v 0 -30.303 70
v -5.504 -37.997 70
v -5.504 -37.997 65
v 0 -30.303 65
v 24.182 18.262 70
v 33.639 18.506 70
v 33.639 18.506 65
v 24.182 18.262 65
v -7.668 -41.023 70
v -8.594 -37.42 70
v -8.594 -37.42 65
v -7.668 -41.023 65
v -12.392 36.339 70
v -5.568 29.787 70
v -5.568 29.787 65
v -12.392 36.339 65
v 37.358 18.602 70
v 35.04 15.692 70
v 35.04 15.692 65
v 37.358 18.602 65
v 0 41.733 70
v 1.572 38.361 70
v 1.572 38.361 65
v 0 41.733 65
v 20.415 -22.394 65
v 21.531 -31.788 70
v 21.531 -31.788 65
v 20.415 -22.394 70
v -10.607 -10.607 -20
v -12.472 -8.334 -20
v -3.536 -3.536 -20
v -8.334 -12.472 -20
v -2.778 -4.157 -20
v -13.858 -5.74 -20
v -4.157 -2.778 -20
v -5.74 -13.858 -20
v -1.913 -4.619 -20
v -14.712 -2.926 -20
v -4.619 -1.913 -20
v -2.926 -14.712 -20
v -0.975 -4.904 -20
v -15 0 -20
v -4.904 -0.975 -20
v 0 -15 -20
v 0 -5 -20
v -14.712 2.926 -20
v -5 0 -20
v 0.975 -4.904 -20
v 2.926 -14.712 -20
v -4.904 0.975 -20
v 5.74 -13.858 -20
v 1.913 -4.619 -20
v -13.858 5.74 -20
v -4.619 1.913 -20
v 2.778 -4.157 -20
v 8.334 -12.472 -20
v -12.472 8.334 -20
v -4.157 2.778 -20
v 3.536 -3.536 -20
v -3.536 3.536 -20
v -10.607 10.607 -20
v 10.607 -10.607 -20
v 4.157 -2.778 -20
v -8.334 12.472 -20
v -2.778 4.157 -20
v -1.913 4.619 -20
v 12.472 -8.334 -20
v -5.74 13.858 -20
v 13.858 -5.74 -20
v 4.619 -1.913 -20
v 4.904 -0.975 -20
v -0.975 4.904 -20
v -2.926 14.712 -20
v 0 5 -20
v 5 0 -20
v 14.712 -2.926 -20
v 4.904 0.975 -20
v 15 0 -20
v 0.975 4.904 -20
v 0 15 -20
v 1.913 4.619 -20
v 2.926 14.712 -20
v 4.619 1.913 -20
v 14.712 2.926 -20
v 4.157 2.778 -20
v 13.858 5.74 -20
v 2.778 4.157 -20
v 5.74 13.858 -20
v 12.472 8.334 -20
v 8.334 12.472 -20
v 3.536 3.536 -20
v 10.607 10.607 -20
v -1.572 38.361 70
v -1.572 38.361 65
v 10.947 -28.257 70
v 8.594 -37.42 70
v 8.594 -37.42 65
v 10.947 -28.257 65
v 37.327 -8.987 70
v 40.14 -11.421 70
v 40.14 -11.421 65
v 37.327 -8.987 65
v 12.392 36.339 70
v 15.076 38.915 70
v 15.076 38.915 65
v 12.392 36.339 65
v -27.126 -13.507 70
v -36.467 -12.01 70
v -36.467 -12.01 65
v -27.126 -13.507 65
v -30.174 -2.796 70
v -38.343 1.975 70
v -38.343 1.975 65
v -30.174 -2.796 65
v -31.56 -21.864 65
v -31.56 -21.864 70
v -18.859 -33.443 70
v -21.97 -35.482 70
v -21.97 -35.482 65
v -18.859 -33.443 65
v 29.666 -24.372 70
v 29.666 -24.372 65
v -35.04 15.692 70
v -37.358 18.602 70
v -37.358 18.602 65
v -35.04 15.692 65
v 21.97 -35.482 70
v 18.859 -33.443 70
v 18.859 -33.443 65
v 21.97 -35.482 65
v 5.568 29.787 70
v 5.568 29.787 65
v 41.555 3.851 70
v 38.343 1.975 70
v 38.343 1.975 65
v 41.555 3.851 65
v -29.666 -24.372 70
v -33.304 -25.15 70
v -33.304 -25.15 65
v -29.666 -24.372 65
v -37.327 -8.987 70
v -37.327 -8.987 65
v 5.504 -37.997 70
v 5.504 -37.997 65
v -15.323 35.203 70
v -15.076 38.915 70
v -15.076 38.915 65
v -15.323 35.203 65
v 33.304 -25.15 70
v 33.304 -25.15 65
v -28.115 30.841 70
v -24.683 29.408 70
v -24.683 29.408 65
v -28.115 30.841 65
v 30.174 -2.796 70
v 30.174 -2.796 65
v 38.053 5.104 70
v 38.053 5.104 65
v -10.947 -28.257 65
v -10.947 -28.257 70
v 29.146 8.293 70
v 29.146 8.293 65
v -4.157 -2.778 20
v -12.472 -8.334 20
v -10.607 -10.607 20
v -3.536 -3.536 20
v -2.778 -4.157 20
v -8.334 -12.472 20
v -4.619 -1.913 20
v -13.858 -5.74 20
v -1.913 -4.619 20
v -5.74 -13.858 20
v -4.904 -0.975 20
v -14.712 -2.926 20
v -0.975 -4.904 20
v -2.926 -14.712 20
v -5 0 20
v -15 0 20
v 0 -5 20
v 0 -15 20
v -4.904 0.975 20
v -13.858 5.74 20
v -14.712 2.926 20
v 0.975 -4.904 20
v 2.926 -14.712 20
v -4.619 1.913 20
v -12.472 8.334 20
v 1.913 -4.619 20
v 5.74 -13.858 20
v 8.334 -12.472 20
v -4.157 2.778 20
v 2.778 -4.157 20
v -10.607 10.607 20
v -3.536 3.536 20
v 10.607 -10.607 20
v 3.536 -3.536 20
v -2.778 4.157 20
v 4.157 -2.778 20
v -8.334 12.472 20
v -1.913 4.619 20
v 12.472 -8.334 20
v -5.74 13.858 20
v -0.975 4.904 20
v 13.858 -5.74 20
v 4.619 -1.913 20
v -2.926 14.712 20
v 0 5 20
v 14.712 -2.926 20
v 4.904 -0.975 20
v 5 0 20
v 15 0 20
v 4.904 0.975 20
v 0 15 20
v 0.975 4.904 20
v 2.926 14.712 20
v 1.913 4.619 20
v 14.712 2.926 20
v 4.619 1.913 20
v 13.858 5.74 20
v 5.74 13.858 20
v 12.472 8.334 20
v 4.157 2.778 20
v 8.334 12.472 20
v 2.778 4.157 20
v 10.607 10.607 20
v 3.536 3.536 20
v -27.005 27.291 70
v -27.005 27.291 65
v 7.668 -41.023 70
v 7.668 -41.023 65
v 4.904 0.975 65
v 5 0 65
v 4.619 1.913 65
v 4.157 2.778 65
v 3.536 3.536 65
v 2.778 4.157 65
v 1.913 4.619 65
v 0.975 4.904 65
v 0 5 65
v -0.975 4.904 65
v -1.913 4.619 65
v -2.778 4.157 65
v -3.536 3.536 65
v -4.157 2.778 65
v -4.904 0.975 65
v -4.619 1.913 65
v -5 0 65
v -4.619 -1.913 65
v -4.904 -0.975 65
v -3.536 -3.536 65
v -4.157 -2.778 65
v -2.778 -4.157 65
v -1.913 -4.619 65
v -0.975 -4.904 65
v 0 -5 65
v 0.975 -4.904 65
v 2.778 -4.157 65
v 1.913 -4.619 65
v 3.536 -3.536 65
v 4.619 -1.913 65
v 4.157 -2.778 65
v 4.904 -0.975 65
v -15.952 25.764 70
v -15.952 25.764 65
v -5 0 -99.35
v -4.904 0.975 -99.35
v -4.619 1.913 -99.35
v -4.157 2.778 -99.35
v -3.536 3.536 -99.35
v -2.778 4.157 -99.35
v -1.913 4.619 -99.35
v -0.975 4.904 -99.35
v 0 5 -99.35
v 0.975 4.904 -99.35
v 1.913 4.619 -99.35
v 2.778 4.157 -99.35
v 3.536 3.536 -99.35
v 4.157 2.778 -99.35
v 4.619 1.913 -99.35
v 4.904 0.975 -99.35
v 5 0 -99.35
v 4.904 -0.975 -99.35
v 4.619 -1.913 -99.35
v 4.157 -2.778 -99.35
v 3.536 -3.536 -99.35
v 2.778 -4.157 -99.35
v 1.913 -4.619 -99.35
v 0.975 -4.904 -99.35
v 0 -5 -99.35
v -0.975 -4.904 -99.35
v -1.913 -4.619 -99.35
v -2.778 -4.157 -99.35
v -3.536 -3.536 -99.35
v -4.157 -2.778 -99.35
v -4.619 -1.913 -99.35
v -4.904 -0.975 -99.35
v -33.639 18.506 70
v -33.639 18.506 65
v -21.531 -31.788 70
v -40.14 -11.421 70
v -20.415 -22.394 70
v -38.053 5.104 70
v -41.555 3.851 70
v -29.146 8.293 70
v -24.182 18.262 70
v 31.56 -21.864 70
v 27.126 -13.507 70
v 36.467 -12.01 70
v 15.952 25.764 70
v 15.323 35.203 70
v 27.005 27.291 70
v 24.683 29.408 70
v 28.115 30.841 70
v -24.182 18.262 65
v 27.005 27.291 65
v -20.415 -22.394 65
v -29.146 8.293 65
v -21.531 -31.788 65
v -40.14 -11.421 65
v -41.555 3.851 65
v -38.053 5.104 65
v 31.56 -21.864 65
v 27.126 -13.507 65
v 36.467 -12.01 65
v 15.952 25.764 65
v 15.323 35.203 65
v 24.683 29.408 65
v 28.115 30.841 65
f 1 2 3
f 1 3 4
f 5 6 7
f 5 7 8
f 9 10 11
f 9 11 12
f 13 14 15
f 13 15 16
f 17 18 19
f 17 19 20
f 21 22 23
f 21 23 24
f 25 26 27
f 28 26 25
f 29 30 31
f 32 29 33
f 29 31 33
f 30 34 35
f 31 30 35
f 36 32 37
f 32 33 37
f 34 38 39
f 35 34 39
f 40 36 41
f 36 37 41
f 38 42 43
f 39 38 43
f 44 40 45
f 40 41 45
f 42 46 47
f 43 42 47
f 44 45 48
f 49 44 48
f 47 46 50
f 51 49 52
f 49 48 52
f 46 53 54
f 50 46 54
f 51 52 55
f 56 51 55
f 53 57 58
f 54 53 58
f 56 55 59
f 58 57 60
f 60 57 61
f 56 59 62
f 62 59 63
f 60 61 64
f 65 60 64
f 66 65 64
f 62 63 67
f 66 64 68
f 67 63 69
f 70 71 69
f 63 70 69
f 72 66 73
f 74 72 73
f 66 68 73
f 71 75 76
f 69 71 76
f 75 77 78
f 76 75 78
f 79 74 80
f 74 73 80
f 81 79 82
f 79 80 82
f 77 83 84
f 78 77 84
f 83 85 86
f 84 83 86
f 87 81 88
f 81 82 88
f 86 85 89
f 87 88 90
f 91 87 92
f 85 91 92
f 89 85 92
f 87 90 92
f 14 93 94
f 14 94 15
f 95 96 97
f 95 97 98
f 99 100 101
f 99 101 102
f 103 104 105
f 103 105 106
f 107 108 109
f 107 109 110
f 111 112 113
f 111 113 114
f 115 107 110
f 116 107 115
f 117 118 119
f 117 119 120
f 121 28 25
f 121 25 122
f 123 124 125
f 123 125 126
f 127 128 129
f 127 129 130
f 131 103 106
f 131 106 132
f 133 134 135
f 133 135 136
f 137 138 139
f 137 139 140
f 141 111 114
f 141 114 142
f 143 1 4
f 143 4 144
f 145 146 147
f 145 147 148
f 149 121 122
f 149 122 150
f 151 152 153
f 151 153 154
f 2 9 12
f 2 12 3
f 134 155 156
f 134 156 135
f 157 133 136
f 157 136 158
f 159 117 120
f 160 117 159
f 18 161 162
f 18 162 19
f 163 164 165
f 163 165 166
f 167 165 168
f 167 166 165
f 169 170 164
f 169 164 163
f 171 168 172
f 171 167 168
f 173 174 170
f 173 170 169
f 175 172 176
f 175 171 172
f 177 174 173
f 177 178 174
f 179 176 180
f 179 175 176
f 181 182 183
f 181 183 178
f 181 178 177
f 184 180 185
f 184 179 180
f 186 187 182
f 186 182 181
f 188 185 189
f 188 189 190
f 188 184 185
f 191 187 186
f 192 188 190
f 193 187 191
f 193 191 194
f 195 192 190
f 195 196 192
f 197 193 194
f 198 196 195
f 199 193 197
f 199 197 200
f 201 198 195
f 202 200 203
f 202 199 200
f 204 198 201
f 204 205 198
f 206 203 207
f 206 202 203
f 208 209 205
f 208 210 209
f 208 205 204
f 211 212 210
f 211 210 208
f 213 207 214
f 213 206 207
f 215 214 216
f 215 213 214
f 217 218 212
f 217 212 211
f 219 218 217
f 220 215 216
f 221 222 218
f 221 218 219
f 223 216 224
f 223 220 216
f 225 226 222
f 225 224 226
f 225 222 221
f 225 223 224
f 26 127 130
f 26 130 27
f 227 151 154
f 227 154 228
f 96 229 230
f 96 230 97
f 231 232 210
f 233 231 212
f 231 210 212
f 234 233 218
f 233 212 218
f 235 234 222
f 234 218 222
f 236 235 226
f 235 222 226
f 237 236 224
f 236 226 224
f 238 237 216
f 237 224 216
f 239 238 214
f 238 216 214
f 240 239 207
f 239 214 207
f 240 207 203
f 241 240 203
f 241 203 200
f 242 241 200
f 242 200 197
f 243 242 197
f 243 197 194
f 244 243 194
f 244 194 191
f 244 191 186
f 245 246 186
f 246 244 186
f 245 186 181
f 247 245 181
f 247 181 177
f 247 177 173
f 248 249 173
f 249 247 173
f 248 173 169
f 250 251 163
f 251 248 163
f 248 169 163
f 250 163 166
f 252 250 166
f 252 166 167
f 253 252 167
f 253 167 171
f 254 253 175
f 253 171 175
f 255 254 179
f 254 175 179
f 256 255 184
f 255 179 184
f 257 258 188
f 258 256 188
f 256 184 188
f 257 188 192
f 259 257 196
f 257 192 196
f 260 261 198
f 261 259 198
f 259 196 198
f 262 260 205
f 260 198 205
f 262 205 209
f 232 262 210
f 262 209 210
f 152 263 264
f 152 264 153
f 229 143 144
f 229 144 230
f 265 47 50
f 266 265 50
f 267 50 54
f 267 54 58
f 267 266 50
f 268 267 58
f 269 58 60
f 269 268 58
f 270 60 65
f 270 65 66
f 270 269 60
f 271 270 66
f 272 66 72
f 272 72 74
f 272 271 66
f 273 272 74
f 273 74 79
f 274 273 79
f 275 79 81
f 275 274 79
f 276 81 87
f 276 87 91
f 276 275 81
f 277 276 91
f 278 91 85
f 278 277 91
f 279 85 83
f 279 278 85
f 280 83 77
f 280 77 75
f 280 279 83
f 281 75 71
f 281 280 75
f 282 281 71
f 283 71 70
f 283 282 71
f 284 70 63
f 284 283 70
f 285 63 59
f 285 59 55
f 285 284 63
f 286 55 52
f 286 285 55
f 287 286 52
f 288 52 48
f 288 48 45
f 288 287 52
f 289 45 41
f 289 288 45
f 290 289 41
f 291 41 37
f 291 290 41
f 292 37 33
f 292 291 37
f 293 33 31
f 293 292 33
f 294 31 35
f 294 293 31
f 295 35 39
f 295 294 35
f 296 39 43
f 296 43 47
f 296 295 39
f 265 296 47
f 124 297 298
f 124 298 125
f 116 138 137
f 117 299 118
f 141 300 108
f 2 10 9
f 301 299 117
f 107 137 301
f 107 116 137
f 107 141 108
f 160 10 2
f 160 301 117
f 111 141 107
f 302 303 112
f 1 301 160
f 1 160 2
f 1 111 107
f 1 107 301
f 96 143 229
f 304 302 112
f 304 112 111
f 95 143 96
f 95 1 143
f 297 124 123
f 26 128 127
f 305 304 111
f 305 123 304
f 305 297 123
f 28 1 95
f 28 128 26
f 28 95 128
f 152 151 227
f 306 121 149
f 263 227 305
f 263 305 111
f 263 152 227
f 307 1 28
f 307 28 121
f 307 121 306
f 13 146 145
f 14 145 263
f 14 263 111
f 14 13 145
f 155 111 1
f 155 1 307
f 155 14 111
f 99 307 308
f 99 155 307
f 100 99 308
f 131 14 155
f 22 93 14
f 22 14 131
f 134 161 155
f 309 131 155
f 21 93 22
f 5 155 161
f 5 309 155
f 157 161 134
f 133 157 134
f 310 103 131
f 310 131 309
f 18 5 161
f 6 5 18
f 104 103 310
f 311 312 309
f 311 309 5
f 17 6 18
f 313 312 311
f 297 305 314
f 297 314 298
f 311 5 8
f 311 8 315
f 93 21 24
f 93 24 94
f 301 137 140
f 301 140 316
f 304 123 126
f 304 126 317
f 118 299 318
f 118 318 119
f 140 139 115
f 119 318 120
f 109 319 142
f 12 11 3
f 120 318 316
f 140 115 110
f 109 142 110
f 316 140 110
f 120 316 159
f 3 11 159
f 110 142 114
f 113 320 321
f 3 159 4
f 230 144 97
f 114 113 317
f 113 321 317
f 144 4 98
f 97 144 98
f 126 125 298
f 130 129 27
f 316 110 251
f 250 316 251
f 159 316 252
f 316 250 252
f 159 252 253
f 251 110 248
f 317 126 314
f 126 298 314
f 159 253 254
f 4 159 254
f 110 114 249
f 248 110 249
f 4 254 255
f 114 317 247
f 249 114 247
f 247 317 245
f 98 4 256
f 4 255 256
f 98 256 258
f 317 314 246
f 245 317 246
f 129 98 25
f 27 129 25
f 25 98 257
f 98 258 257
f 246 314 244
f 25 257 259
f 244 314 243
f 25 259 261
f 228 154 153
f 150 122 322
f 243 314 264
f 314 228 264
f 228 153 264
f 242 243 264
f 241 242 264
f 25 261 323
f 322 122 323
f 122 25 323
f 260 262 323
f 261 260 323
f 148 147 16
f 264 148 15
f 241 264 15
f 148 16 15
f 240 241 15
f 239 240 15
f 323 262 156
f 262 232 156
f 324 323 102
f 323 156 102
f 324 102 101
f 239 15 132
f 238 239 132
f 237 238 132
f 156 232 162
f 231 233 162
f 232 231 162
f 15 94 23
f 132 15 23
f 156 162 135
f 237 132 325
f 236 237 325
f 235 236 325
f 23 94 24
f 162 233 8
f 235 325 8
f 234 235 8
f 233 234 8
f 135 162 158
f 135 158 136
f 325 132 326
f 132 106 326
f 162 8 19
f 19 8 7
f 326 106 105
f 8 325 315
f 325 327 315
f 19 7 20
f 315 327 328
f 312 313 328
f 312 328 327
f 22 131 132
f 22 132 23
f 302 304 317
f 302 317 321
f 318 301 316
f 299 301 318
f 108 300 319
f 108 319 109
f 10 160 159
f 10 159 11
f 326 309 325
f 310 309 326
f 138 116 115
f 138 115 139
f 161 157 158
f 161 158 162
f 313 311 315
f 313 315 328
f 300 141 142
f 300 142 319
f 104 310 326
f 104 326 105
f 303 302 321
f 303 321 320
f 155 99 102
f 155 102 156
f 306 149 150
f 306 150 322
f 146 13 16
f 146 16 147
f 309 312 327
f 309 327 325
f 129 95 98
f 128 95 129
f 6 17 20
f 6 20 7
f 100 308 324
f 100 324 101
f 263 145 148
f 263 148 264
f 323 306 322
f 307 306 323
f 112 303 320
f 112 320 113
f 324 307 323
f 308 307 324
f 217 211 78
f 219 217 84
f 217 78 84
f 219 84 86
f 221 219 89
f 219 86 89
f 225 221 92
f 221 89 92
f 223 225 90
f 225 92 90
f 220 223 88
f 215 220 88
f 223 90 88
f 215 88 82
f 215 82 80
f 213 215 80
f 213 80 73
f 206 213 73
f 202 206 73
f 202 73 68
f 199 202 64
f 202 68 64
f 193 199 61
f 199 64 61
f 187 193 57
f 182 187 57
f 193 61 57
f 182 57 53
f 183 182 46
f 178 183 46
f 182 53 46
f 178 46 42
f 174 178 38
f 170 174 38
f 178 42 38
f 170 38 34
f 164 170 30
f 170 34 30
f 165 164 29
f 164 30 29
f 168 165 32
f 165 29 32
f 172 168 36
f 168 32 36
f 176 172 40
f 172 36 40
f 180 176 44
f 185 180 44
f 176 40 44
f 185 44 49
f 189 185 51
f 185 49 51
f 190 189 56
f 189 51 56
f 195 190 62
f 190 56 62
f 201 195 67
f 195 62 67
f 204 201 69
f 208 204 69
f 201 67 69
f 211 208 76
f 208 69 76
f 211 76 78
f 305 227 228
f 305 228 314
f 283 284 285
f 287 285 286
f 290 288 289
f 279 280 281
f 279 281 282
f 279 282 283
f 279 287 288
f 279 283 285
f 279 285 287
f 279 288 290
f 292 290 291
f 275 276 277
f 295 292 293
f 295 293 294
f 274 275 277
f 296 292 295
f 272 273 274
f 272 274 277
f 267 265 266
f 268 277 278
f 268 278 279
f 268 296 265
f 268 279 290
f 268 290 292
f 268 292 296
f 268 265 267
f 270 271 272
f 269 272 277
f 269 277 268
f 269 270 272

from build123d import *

# Parameters (mm, degrees)
BOSS_EXTRU_1_DEPTH      = 20
BOSS_EXTRU_1_DEPTH_BACK = 20
ESQUISSE1_R             = 15
ESQUISSE2_R             = 5
BOSS_EXTRU_2_DEPTH      = 50
BOSS_EXTRU_4_DEPTH      = 5
BOSS_EXTRU_5_START      = 79.35
ESQUISSE5_R             = 5
BOSS_EXTRU_5_DEPTH      = 79.35


with BuildPart() as part:
    # Esquisse1 → Boss.-Extru.1 (new, two sides: drawn at the far end of the back side and taken through both)
    with BuildSketch(Plane.XY.offset(-BOSS_EXTRU_1_DEPTH_BACK)):
        Circle(ESQUISSE1_R)
    extrude(amount=BOSS_EXTRU_1_DEPTH + BOSS_EXTRU_1_DEPTH_BACK)

    # Esquisse2 → Boss.-Extru.2 (add)
    with BuildSketch(Plane.XY.offset(20)):
        Circle(ESQUISSE2_R)
    extrude(amount=BOSS_EXTRU_2_DEPTH)

    # Esquisse3 → Boss.-Extru.4 (add)
    with BuildSketch(Plane.XY.offset(70)):
        Polygon((-1.571578965, 38.361483473), (-5.568168614, 29.787071155), (-12.392312465, 36.338737822), (-15.075770583, 38.915049734), (-15.323219948, 35.203298214), (-15.952493815, 25.76416214), (-24.682553429, 29.408244268), (-28.115474811, 30.841206699), (-27.005375168, 27.290712462), (-24.182346331, 18.261660264), (-33.639278782, 18.506004369), (-37.358028372, 18.602087802), (-35.04030483, 15.69236477), (-29.146238976, 8.292819978), (-38.052833133, 5.104426035), (-41.555173194, 3.85065387), (-38.342847159, 1.974676262), (-30.173770542, -2.796011598), (-37.327141512, -8.98653332), (-40.140061611, -11.420832204), (-36.466975515, -12.009703218), (-27.126167198, -13.507226314), (-31.560212593, -21.863811553), (-33.303812283, -25.149871604), (-29.666036756, -24.37210573), (-20.415024663, -22.39421527), (-21.530902082, -31.788260884), (-21.969698564, -35.482281483), (-18.858535349, -33.442920312), (-10.946719923, -28.256741363), (-8.593723938, -37.419529438), (-7.668455316, -41.022612634), (-5.504084244, -37.997083192), (0, -30.303037958), (5.504084244, -37.997083192), (7.668455316, -41.022612634), (8.593723938, -37.419529438), (10.946719923, -28.256741363), (18.858535349, -33.442920312), (21.969698564, -35.482281483), (21.530902082, -31.788260884), (20.415024663, -22.39421527), (29.666036756, -24.37210573), (33.303812283, -25.149871604), (31.560212593, -21.863811553), (27.126167198, -13.507226314), (36.466975515, -12.009703218), (40.140061611, -11.420832204), (37.327141512, -8.98653332), (30.173770542, -2.796011598), (38.342847159, 1.974676262), (41.555173194, 3.85065387), (38.052833133, 5.104426035), (29.146238976, 8.292819978), (35.04030483, 15.69236477), (37.358028372, 18.602087802), (33.639278782, 18.506004369), (24.182346331, 18.261660264), (27.005375168, 27.290712462), (28.115474811, 30.841206699), (24.682553429, 29.408244268), (15.952493815, 25.76416214), (15.323219948, 35.203298214), (15.075770583, 38.915049734), (12.392312465, 36.338737822), (5.568168614, 29.787071155), (1.571578965, 38.361483473), (0, 41.733199668), align=None)
    extrude(amount=-BOSS_EXTRU_4_DEPTH)

    # Esquisse5 → Boss.-Extru.5 (add)
    with BuildSketch(Plane(origin=(0, 0, -20), x_dir=(-1, 0, 0), z_dir=(0, 0, -1)).offset(BOSS_EXTRU_5_START)):
        Circle(ESQUISSE5_R)
    extrude(amount=-BOSS_EXTRU_5_DEPTH)


solid = part.part
